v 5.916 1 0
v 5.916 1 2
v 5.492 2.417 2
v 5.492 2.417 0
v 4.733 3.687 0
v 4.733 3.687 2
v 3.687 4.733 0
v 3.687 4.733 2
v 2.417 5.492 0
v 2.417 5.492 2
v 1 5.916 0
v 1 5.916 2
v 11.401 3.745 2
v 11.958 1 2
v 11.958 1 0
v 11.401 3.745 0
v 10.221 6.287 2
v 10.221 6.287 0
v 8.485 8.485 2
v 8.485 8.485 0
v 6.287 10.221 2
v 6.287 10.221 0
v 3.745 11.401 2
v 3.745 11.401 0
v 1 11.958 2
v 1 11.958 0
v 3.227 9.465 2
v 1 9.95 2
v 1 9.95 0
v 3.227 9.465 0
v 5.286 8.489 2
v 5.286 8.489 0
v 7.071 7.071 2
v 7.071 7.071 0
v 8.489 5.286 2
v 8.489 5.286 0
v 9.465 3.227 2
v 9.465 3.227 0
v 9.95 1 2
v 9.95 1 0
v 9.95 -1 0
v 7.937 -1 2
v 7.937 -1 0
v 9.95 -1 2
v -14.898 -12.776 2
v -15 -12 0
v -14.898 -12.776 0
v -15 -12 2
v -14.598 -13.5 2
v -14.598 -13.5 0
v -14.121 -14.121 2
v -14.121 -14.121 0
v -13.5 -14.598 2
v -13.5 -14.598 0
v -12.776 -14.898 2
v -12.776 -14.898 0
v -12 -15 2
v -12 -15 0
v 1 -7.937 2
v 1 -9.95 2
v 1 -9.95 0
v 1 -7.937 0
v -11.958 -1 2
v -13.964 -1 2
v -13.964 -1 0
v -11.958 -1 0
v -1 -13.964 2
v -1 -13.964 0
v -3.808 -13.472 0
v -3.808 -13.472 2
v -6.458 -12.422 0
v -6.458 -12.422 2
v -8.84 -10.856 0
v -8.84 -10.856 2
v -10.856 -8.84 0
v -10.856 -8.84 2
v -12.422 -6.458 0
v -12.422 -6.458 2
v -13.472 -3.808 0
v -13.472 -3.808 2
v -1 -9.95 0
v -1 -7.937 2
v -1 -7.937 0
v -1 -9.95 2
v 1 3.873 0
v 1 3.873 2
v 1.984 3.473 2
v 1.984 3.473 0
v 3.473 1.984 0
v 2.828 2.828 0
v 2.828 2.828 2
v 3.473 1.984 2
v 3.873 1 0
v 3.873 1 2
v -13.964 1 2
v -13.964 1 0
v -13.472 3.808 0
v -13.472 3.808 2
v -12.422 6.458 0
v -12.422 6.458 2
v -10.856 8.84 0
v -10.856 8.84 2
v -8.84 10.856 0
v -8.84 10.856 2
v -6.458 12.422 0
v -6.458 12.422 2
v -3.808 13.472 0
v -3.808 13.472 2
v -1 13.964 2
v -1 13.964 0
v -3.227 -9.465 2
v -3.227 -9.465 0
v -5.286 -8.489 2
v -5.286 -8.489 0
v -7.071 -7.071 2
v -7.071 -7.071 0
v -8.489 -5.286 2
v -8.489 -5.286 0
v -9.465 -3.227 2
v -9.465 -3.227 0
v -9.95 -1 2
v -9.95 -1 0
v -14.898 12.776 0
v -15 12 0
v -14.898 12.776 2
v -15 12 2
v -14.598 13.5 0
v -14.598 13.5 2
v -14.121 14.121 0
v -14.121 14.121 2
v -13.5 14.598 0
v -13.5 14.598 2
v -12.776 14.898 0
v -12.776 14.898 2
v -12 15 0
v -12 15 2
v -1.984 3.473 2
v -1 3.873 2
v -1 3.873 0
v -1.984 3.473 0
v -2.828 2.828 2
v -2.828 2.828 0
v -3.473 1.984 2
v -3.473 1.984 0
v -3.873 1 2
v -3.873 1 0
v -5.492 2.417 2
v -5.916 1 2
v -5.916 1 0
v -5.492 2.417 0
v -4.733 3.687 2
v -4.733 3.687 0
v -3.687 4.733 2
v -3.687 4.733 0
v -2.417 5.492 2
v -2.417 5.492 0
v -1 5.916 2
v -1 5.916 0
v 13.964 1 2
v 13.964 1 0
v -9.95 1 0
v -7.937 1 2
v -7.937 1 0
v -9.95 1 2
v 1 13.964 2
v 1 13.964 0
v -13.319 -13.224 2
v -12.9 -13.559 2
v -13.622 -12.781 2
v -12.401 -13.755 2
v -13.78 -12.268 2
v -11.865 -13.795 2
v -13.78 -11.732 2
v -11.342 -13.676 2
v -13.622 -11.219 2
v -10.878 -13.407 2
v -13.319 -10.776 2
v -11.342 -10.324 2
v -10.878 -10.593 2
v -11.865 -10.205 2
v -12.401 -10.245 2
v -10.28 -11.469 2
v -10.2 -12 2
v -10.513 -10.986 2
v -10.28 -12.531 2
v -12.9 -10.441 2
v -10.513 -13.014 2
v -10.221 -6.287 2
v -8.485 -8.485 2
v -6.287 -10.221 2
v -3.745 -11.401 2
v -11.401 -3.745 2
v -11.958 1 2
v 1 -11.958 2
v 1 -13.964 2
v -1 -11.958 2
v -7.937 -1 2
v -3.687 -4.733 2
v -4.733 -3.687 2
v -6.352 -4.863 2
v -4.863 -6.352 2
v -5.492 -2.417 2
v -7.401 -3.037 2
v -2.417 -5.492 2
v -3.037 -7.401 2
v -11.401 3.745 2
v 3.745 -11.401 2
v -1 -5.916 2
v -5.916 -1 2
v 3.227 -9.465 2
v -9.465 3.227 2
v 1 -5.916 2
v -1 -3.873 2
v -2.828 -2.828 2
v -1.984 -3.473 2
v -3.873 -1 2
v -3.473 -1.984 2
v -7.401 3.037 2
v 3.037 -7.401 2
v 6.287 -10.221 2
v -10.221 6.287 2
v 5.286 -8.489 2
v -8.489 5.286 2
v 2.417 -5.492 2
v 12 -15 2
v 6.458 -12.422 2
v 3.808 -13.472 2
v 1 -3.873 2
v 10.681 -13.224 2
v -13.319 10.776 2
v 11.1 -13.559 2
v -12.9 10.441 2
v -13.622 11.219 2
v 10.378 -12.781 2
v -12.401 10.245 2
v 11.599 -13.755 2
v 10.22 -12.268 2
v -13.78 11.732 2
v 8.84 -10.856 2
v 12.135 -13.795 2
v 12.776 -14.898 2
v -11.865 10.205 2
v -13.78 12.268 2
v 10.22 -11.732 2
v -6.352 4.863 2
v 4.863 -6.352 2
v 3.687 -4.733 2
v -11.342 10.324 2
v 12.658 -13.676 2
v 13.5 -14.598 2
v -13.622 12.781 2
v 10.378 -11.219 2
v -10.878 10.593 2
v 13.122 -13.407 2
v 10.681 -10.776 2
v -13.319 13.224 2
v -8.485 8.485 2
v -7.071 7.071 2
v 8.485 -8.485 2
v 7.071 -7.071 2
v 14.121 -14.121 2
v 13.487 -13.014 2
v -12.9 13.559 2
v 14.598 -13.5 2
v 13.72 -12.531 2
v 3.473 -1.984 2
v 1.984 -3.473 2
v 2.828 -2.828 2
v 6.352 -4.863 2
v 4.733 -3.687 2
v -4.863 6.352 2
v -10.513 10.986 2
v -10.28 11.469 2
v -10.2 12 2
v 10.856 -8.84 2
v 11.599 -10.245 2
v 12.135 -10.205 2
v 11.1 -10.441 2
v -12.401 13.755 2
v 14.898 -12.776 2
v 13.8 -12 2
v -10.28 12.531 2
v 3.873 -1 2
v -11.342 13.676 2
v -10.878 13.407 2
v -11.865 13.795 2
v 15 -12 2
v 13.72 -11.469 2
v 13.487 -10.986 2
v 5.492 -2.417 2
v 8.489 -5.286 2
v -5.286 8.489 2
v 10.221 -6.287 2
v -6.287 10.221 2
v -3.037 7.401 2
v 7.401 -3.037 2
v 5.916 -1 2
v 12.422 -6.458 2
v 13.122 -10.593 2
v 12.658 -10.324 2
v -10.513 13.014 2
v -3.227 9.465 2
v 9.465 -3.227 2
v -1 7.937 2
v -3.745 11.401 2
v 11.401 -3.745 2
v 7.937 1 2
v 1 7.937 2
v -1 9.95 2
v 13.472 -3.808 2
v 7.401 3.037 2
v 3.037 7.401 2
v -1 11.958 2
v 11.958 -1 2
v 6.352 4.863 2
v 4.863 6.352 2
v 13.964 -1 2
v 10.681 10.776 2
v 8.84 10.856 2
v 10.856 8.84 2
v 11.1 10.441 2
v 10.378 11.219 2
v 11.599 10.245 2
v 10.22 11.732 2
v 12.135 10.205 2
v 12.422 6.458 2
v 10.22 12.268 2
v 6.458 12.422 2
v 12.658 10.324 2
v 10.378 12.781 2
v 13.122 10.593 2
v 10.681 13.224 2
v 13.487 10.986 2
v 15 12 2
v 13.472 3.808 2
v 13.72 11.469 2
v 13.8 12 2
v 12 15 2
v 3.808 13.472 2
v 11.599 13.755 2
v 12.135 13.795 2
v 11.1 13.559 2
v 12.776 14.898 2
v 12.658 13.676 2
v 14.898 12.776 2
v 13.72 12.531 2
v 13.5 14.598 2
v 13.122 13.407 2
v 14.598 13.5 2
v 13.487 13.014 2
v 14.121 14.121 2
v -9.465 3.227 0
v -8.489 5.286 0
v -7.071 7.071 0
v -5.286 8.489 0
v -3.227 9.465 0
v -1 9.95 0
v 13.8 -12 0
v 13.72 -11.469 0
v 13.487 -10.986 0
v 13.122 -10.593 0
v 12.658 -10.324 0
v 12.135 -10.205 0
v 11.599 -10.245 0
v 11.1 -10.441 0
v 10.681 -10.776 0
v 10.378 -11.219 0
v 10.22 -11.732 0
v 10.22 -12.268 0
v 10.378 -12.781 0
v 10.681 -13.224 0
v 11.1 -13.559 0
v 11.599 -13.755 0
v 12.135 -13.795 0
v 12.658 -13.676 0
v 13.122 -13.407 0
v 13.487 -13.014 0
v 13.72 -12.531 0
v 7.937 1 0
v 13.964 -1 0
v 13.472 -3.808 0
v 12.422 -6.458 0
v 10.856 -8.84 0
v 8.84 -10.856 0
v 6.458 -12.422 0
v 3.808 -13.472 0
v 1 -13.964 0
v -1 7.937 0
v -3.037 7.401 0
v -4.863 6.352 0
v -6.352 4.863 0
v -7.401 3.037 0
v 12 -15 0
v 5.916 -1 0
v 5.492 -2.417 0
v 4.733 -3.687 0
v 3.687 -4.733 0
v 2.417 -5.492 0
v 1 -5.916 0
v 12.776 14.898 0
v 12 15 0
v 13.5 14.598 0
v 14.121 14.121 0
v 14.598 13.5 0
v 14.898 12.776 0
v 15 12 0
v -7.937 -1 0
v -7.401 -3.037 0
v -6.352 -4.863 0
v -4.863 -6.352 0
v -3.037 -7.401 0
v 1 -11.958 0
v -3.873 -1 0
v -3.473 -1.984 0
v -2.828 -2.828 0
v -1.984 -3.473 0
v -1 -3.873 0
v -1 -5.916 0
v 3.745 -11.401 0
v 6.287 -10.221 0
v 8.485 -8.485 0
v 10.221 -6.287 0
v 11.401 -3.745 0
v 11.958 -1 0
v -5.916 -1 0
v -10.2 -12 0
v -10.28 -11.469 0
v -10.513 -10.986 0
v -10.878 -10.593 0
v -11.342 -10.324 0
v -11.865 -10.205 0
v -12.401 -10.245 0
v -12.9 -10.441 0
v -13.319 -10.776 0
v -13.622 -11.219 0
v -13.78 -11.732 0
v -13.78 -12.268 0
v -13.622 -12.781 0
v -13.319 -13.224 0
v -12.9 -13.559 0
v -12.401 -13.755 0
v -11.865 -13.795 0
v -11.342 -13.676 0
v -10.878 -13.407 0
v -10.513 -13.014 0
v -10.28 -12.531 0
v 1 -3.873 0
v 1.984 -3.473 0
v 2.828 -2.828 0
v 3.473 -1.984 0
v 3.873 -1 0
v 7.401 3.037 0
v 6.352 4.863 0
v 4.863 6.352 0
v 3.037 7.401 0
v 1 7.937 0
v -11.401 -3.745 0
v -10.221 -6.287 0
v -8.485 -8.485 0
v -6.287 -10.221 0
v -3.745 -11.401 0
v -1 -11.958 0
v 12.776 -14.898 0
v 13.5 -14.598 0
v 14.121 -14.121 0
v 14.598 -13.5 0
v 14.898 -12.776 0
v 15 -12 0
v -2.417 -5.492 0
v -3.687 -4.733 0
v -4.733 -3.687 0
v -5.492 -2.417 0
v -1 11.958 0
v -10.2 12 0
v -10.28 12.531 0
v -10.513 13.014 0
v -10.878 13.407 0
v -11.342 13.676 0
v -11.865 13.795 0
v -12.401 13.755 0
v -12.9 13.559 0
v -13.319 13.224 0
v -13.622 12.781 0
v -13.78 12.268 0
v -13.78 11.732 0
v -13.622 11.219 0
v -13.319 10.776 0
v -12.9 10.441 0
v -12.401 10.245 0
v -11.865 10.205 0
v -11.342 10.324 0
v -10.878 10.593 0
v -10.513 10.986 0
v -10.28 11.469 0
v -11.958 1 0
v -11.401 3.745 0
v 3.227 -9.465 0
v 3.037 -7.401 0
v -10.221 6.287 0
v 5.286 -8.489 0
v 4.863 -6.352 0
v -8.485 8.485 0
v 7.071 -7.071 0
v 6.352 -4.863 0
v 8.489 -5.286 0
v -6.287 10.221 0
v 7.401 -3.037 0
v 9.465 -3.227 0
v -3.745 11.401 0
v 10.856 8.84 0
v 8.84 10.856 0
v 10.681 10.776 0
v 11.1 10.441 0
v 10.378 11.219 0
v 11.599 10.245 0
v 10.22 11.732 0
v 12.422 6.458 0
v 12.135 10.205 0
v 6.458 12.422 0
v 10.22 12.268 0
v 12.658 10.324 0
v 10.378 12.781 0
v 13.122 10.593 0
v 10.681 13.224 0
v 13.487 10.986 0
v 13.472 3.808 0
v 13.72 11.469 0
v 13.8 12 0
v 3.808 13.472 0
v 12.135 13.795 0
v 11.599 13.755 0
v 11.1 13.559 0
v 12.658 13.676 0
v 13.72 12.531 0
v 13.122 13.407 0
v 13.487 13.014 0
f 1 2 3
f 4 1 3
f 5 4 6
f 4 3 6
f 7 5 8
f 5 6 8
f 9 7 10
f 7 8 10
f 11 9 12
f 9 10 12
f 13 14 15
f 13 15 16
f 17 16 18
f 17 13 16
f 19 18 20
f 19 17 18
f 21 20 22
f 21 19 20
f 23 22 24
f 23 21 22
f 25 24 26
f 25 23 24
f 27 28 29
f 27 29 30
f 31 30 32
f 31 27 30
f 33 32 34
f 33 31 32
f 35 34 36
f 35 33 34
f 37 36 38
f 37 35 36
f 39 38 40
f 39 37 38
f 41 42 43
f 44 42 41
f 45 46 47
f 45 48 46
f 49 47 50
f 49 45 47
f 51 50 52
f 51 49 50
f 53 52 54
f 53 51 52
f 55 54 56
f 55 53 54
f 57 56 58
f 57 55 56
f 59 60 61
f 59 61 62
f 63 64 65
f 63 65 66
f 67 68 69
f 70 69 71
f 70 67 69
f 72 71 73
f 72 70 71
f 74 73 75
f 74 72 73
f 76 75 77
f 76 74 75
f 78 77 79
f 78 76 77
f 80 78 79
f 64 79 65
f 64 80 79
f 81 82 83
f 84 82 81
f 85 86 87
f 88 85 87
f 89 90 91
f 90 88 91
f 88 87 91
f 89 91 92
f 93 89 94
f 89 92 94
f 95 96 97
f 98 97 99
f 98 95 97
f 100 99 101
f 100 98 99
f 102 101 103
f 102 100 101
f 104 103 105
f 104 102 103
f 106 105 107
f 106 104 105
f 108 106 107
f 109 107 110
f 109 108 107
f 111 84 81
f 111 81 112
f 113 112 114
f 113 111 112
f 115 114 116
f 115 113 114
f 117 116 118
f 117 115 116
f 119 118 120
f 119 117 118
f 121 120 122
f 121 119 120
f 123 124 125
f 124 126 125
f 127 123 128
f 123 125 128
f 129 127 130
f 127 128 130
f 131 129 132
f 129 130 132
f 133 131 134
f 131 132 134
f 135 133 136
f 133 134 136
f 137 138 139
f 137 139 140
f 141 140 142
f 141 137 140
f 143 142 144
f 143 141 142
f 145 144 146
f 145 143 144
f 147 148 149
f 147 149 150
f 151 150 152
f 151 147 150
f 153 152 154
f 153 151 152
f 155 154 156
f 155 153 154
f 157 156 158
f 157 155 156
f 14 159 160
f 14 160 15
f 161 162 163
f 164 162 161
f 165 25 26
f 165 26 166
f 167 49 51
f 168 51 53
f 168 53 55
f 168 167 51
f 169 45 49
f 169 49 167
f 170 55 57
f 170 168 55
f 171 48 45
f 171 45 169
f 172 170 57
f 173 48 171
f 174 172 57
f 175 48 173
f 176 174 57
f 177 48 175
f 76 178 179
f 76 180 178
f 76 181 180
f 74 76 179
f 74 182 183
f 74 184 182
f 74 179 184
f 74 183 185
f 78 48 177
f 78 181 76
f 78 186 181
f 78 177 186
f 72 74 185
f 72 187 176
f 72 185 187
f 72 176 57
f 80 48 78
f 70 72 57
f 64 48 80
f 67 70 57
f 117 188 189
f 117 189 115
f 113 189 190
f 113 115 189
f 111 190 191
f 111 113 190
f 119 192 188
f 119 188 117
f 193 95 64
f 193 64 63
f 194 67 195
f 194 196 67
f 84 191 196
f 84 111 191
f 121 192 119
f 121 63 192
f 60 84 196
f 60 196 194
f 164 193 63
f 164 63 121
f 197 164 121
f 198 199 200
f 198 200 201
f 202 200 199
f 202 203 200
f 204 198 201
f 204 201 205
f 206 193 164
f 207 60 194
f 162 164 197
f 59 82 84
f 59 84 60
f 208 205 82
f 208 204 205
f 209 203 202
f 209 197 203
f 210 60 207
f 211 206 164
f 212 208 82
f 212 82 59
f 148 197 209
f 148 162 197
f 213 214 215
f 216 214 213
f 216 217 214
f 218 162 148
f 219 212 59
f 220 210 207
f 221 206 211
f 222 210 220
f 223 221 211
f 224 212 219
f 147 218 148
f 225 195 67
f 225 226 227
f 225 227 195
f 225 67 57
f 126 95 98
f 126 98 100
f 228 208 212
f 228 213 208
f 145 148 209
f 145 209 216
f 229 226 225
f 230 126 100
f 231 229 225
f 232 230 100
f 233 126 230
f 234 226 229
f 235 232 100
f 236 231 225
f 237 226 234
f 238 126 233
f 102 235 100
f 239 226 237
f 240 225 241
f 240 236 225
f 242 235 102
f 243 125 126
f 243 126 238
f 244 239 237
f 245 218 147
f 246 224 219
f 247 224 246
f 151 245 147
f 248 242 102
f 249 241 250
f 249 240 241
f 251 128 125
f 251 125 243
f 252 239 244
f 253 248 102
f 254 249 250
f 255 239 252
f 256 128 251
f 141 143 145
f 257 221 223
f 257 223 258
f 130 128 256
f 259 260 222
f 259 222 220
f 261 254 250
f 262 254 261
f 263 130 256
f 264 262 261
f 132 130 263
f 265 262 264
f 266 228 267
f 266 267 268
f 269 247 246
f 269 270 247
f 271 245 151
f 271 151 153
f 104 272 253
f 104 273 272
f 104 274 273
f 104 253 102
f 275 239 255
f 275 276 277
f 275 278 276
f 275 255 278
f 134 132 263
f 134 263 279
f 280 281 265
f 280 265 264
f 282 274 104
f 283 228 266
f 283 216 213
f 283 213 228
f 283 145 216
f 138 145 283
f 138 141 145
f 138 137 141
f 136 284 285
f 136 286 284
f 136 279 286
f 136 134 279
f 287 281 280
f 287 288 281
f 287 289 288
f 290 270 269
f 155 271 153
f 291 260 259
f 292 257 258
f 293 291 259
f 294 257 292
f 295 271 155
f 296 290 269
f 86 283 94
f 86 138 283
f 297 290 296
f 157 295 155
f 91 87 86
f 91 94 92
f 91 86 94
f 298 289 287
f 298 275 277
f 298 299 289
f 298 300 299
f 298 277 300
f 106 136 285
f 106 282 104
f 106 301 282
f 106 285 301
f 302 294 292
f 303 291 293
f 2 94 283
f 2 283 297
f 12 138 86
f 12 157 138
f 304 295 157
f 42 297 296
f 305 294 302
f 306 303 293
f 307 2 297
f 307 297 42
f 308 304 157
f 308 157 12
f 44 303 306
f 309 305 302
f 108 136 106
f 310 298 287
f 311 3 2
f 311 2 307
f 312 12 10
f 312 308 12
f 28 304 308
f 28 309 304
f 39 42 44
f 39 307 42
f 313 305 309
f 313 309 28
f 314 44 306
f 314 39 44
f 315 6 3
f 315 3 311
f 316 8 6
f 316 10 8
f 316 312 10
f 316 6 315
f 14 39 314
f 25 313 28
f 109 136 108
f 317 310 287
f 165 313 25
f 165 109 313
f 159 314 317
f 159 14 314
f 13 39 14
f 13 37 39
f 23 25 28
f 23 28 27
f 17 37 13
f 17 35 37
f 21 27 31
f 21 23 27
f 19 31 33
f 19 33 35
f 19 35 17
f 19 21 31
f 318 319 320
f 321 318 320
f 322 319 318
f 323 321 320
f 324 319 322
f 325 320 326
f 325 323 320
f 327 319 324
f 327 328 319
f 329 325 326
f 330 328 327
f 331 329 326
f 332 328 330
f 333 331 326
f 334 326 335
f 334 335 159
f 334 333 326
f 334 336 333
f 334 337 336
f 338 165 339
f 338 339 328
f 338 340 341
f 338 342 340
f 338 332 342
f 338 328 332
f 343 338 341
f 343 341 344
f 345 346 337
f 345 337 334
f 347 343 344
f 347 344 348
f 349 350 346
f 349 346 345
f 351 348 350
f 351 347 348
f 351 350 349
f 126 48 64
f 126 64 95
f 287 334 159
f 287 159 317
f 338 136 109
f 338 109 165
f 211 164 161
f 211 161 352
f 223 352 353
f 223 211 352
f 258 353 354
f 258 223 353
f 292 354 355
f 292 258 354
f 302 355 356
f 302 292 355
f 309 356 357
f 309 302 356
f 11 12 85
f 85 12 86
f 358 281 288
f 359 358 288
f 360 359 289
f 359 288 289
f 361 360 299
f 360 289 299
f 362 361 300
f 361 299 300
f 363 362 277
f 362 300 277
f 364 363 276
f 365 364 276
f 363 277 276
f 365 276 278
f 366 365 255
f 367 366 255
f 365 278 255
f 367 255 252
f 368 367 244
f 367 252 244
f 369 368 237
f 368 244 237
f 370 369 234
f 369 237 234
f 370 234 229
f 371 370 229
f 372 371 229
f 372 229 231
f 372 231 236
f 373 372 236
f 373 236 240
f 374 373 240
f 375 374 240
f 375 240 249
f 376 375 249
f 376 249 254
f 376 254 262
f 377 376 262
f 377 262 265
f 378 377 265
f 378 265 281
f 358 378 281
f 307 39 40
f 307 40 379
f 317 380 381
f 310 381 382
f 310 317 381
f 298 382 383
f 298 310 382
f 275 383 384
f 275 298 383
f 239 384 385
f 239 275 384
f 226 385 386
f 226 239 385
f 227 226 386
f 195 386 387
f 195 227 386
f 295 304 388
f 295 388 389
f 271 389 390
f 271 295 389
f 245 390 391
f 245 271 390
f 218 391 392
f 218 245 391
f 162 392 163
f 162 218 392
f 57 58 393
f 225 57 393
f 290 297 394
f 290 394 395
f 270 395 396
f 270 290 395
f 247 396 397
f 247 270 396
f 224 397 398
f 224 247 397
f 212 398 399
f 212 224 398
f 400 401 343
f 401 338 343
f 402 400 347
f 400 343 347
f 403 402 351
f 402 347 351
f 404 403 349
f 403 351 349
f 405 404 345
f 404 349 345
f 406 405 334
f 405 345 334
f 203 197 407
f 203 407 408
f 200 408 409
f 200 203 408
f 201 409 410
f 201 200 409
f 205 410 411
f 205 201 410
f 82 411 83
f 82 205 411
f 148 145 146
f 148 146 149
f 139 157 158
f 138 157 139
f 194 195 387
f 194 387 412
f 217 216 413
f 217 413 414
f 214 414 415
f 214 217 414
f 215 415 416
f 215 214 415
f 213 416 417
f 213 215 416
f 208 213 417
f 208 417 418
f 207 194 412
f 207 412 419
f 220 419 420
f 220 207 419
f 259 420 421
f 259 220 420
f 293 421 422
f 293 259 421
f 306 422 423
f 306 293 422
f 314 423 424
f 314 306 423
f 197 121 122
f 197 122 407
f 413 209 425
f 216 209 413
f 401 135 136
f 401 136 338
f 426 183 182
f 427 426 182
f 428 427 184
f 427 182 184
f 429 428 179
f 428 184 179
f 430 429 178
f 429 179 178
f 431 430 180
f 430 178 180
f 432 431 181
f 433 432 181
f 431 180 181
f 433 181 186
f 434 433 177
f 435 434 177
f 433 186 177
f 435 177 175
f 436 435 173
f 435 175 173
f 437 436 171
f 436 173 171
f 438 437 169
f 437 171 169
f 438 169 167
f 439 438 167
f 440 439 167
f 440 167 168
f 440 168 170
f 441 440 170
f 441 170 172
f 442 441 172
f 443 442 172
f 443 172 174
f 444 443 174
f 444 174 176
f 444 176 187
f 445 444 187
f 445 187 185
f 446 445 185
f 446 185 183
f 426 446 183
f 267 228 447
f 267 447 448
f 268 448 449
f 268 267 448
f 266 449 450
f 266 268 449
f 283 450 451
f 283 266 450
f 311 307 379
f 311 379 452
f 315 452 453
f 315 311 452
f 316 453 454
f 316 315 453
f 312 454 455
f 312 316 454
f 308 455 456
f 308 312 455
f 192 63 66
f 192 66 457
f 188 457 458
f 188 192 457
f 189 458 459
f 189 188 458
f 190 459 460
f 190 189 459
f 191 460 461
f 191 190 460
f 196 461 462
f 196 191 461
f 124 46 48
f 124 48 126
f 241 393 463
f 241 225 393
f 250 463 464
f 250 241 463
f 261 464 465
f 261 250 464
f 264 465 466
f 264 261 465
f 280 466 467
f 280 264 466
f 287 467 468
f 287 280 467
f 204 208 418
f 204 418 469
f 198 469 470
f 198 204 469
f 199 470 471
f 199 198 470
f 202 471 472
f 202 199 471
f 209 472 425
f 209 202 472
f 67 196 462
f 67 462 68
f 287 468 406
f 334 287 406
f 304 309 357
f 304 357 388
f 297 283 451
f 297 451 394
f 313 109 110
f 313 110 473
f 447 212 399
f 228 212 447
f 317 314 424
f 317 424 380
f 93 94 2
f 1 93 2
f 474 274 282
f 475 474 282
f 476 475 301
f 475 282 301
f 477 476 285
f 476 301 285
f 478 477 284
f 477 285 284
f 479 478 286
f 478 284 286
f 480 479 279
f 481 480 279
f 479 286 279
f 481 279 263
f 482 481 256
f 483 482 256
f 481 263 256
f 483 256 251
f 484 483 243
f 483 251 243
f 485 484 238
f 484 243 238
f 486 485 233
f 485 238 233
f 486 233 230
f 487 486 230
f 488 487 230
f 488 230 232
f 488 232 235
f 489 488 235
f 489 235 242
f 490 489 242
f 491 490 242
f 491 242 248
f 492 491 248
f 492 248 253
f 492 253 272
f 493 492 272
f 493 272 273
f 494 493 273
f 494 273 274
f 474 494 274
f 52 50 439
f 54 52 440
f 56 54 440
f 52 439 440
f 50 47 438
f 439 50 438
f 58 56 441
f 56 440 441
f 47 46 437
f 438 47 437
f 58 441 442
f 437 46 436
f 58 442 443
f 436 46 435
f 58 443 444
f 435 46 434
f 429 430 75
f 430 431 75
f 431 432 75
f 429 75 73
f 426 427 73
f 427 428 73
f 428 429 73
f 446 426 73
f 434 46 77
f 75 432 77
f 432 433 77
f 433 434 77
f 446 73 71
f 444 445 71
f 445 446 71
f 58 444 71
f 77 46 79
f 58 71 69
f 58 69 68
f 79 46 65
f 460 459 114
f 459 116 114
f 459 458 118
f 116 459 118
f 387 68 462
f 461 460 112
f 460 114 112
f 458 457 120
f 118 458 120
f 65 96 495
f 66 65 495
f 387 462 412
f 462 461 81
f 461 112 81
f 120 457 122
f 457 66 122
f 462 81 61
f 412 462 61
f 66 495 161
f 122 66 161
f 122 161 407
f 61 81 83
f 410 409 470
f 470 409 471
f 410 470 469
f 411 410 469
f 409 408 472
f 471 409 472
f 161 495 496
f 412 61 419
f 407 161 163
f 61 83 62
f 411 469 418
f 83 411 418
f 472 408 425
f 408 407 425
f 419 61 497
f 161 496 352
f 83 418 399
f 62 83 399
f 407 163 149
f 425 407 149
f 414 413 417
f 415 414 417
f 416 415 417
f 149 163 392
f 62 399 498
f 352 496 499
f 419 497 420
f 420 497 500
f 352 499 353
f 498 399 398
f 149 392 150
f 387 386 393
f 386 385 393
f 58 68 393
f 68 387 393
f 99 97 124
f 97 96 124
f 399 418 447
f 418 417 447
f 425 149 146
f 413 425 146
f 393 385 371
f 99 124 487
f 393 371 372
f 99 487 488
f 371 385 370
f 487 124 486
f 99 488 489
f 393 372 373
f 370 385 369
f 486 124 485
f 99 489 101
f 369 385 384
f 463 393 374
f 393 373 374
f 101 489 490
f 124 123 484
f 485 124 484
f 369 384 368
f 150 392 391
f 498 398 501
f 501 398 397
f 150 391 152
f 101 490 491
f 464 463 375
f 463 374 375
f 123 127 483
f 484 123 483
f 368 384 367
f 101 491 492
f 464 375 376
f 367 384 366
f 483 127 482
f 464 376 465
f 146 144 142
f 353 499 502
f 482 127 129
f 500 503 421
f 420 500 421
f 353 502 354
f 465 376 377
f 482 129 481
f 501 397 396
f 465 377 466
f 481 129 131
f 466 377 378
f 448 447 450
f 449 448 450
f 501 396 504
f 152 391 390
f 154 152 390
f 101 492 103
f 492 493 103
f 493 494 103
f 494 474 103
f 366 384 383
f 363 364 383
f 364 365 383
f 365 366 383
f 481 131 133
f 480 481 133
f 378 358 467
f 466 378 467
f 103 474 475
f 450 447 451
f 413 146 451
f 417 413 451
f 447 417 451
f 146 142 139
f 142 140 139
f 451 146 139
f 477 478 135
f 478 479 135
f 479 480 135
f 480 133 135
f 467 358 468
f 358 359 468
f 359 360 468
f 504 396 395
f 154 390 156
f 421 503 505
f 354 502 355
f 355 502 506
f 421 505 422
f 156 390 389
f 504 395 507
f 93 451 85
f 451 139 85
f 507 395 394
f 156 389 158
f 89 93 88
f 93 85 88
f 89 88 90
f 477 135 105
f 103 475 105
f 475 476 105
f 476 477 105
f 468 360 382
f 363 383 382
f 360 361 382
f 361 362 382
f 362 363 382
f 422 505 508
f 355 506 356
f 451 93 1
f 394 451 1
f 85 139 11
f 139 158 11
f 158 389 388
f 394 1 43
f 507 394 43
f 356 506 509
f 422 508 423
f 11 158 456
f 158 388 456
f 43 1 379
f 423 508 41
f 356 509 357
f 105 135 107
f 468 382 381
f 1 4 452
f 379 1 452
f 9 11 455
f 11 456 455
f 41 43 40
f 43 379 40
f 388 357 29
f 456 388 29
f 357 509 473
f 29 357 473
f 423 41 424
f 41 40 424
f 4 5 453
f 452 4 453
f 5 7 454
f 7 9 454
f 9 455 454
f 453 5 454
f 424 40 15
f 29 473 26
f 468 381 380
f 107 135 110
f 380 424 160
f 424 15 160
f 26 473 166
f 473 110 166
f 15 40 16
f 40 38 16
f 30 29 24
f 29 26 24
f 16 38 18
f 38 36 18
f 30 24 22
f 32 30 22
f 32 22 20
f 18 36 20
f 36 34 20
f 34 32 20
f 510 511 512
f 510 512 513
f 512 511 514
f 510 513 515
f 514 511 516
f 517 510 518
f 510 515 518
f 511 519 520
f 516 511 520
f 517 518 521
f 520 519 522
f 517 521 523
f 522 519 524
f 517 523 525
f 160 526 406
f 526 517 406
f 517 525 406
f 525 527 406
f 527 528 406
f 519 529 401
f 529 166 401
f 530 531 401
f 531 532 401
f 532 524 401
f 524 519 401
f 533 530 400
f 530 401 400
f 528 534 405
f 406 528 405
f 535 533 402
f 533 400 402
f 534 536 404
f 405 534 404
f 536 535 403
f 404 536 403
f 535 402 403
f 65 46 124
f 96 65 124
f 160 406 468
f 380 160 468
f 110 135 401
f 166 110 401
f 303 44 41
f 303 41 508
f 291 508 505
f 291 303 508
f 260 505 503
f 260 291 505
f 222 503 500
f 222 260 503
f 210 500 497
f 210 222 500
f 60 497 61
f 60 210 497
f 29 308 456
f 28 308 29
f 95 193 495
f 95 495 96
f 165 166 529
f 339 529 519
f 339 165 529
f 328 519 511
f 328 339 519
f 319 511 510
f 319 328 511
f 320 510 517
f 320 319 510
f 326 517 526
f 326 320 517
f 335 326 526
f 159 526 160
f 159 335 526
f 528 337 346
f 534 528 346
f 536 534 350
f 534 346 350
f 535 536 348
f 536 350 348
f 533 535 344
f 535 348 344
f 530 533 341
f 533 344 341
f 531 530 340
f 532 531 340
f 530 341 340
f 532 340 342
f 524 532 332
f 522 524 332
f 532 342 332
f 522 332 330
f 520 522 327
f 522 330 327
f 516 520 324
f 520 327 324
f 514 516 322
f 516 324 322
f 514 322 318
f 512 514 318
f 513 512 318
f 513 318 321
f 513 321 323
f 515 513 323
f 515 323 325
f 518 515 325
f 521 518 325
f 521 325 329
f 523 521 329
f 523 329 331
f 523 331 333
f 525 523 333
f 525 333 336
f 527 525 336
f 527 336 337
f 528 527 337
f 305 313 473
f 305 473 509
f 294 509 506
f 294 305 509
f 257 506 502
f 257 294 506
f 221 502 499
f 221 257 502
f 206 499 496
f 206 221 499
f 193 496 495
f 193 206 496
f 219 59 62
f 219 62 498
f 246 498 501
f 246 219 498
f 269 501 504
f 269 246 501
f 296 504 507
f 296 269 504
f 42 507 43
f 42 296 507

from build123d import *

# Parameters (mm, degrees)
SKETCH1_W           = 30
SKETCH1_H           = 30
BOSS_EXTRUDE1_DEPTH = 2
SKETCH2_R           = 1.8
CUT_EXTRUDE1_DEPTH  = 22.307275753
FILLET1_R           = 3
CUT_EXTRUDE2_DEPTH  = 22.307275753


with BuildPart() as part:
    # Sketch1 → Boss-Extrude1 (new body)
    with BuildSketch(Plane.XY):
        Rectangle(SKETCH1_W, SKETCH1_H)
    extrude(amount=BOSS_EXTRUDE1_DEPTH)

    # Sketch2 → Cut-Extrude1 (cut, through all)
    with BuildSketch(Plane.XY.offset(2)):
        with Locations((-12, 12)):
            Circle(SKETCH2_R)
        with Locations((12, 12)):
            Circle(SKETCH2_R)
        with Locations((12, -12)):
            Circle(SKETCH2_R)
        with Locations((-12, -12)):
            Circle(SKETCH2_R)
    extrude(amount=-CUT_EXTRUDE1_DEPTH, mode=Mode.SUBTRACT)

    # Fillet1
    fillet1_edges = [part.edges().sort_by_distance(p)[0] for p in [
        (15, -15, 1),
        (-15, -15, 1),
        (-15, 15, 1),
        (15, 15, 1),
    ]]
    fillet(fillet1_edges, radius=FILLET1_R)

    # Sketch3 → Cut-Extrude2 (cut, through all)
    with BuildSketch(Plane.XY.offset(2)):
        with BuildLine():
            Line((-7.937253933, 1), (-9.949874371, 1))
            ThreePointArc((-9.949874371, 1), (-7.071067812, 7.071067812), (-1, 9.949874371))
            Line((-1, 9.949874371), (-1, 7.937253933))
            ThreePointArc((-1, 7.937253933), (-5.656854249, 5.656854249), (-7.937253933, 1))
        make_face()
        with BuildLine():
            Line((-1, -3.872983346), (-1, -5.916079783))
            ThreePointArc((-1, -5.916079783), (-4.242640687, -4.242640687), (-5.916079783, -1))
            Line((-5.916079783, -1), (-3.872983346, -1))
            ThreePointArc((-3.872983346, -1), (-2.828427125, -2.828427125), (-1, -3.872983346))
        make_face()
        with BuildLine():
            Line((-3.872983346, 1), (-5.916079783, 1))
            ThreePointArc((-5.916079783, 1), (-4.242640687, 4.242640687), (-1, 5.916079783))
            Line((-1, 5.916079783), (-1, 3.872983346))
            ThreePointArc((-1, 3.872983346), (-2.828427125, 2.828427125), (-3.872983346, 1))
        make_face()
        with BuildLine():
            Line((3.872983346, -1), (5.916079783, -1))
            ThreePointArc((5.916079783, -1), (4.242640687, -4.242640687), (1, -5.916079783))
            Line((1, -5.916079783), (1, -3.872983346))
            ThreePointArc((1, -3.872983346), (2.828427125, -2.828427125), (3.872983346, -1))
        make_face()
        with BuildLine():
            Line((3.872983346, 1), (5.916079783, 1))
            ThreePointArc((5.916079783, 1), (4.242640687, 4.242640687), (1, 5.916079783))
            Line((1, 5.916079783), (1, 3.872983346))
            ThreePointArc((1, 3.872983346), (2.828427125, 2.828427125), (3.872983346, 1))
        make_face()
        with BuildLine():
            Line((-11.958260743, 1), (-13.964240044, 1))
            ThreePointArc((-13.964240044, 1), (-9.899494937, 9.899494937), (-1, 13.964240044))
            Line((-1, 13.964240044), (-1, 11.958260743))
            ThreePointArc((-1, 11.958260743), (-8.485281374, 8.485281374), (-11.958260743, 1))
        make_face()
        with BuildLine():
            Line((1, 11.958260743), (1, 13.964240044))
            ThreePointArc((1, 13.964240044), (9.899494937, 9.899494937), (13.964240044, 1))
            Line((13.964240044, 1), (11.958260743, 1))
            ThreePointArc((11.958260743, 1), (8.485281374, 8.485281374), (1, 11.958260743))
        make_face()
        with BuildLine():
            Line((1, 7.937253933), (1, 9.949874371))
            ThreePointArc((1, 9.949874371), (7.071067812, 7.071067812), (9.949874371, 1))
            Line((9.949874371, 1), (7.937253933, 1))
            ThreePointArc((7.937253933, 1), (5.656854249, 5.656854249), (1, 7.937253933))
        make_face()
        with BuildLine():
            Line((7.937253933, -1), (9.949874371, -1))
            ThreePointArc((9.949874371, -1), (7.071067812, -7.071067812), (1, -9.949874371))
            Line((1, -9.949874371), (1, -7.937253933))
            ThreePointArc((1, -7.937253933), (5.656854249, -5.656854249), (7.937253933, -1))
        make_face()
        with BuildLine():
            Line((11.958260743, -1), (13.964240044, -1))
            ThreePointArc((13.964240044, -1), (9.899494937, -9.899494937), (1, -13.964240044))
            Line((1, -13.964240044), (1, -11.958260743))
            ThreePointArc((1, -11.958260743), (8.485281374, -8.485281374), (11.958260743, -1))
        make_face()
        with BuildLine():
            Line((-1, -11.958260743), (-1, -13.964240044))
            ThreePointArc((-1, -13.964240044), (-9.899494937, -9.899494937), (-13.964240044, -1))
            Line((-13.964240044, -1), (-11.958260743, -1))
            ThreePointArc((-11.958260743, -1), (-8.485281374, -8.485281374), (-1, -11.958260743))
        make_face()
        with BuildLine():
            Line((-1, -7.937253933), (-1, -9.949874371))
            ThreePointArc((-1, -9.949874371), (-7.071067812, -7.071067812), (-9.949874371, -1))
            Line((-9.949874371, -1), (-7.937253933, -1))
            ThreePointArc((-7.937253933, -1), (-5.656854249, -5.656854249), (-1, -7.937253933))
        make_face()
    extrude(amount=-CUT_EXTRUDE2_DEPTH, mode=Mode.SUBTRACT)


solid = part.part
